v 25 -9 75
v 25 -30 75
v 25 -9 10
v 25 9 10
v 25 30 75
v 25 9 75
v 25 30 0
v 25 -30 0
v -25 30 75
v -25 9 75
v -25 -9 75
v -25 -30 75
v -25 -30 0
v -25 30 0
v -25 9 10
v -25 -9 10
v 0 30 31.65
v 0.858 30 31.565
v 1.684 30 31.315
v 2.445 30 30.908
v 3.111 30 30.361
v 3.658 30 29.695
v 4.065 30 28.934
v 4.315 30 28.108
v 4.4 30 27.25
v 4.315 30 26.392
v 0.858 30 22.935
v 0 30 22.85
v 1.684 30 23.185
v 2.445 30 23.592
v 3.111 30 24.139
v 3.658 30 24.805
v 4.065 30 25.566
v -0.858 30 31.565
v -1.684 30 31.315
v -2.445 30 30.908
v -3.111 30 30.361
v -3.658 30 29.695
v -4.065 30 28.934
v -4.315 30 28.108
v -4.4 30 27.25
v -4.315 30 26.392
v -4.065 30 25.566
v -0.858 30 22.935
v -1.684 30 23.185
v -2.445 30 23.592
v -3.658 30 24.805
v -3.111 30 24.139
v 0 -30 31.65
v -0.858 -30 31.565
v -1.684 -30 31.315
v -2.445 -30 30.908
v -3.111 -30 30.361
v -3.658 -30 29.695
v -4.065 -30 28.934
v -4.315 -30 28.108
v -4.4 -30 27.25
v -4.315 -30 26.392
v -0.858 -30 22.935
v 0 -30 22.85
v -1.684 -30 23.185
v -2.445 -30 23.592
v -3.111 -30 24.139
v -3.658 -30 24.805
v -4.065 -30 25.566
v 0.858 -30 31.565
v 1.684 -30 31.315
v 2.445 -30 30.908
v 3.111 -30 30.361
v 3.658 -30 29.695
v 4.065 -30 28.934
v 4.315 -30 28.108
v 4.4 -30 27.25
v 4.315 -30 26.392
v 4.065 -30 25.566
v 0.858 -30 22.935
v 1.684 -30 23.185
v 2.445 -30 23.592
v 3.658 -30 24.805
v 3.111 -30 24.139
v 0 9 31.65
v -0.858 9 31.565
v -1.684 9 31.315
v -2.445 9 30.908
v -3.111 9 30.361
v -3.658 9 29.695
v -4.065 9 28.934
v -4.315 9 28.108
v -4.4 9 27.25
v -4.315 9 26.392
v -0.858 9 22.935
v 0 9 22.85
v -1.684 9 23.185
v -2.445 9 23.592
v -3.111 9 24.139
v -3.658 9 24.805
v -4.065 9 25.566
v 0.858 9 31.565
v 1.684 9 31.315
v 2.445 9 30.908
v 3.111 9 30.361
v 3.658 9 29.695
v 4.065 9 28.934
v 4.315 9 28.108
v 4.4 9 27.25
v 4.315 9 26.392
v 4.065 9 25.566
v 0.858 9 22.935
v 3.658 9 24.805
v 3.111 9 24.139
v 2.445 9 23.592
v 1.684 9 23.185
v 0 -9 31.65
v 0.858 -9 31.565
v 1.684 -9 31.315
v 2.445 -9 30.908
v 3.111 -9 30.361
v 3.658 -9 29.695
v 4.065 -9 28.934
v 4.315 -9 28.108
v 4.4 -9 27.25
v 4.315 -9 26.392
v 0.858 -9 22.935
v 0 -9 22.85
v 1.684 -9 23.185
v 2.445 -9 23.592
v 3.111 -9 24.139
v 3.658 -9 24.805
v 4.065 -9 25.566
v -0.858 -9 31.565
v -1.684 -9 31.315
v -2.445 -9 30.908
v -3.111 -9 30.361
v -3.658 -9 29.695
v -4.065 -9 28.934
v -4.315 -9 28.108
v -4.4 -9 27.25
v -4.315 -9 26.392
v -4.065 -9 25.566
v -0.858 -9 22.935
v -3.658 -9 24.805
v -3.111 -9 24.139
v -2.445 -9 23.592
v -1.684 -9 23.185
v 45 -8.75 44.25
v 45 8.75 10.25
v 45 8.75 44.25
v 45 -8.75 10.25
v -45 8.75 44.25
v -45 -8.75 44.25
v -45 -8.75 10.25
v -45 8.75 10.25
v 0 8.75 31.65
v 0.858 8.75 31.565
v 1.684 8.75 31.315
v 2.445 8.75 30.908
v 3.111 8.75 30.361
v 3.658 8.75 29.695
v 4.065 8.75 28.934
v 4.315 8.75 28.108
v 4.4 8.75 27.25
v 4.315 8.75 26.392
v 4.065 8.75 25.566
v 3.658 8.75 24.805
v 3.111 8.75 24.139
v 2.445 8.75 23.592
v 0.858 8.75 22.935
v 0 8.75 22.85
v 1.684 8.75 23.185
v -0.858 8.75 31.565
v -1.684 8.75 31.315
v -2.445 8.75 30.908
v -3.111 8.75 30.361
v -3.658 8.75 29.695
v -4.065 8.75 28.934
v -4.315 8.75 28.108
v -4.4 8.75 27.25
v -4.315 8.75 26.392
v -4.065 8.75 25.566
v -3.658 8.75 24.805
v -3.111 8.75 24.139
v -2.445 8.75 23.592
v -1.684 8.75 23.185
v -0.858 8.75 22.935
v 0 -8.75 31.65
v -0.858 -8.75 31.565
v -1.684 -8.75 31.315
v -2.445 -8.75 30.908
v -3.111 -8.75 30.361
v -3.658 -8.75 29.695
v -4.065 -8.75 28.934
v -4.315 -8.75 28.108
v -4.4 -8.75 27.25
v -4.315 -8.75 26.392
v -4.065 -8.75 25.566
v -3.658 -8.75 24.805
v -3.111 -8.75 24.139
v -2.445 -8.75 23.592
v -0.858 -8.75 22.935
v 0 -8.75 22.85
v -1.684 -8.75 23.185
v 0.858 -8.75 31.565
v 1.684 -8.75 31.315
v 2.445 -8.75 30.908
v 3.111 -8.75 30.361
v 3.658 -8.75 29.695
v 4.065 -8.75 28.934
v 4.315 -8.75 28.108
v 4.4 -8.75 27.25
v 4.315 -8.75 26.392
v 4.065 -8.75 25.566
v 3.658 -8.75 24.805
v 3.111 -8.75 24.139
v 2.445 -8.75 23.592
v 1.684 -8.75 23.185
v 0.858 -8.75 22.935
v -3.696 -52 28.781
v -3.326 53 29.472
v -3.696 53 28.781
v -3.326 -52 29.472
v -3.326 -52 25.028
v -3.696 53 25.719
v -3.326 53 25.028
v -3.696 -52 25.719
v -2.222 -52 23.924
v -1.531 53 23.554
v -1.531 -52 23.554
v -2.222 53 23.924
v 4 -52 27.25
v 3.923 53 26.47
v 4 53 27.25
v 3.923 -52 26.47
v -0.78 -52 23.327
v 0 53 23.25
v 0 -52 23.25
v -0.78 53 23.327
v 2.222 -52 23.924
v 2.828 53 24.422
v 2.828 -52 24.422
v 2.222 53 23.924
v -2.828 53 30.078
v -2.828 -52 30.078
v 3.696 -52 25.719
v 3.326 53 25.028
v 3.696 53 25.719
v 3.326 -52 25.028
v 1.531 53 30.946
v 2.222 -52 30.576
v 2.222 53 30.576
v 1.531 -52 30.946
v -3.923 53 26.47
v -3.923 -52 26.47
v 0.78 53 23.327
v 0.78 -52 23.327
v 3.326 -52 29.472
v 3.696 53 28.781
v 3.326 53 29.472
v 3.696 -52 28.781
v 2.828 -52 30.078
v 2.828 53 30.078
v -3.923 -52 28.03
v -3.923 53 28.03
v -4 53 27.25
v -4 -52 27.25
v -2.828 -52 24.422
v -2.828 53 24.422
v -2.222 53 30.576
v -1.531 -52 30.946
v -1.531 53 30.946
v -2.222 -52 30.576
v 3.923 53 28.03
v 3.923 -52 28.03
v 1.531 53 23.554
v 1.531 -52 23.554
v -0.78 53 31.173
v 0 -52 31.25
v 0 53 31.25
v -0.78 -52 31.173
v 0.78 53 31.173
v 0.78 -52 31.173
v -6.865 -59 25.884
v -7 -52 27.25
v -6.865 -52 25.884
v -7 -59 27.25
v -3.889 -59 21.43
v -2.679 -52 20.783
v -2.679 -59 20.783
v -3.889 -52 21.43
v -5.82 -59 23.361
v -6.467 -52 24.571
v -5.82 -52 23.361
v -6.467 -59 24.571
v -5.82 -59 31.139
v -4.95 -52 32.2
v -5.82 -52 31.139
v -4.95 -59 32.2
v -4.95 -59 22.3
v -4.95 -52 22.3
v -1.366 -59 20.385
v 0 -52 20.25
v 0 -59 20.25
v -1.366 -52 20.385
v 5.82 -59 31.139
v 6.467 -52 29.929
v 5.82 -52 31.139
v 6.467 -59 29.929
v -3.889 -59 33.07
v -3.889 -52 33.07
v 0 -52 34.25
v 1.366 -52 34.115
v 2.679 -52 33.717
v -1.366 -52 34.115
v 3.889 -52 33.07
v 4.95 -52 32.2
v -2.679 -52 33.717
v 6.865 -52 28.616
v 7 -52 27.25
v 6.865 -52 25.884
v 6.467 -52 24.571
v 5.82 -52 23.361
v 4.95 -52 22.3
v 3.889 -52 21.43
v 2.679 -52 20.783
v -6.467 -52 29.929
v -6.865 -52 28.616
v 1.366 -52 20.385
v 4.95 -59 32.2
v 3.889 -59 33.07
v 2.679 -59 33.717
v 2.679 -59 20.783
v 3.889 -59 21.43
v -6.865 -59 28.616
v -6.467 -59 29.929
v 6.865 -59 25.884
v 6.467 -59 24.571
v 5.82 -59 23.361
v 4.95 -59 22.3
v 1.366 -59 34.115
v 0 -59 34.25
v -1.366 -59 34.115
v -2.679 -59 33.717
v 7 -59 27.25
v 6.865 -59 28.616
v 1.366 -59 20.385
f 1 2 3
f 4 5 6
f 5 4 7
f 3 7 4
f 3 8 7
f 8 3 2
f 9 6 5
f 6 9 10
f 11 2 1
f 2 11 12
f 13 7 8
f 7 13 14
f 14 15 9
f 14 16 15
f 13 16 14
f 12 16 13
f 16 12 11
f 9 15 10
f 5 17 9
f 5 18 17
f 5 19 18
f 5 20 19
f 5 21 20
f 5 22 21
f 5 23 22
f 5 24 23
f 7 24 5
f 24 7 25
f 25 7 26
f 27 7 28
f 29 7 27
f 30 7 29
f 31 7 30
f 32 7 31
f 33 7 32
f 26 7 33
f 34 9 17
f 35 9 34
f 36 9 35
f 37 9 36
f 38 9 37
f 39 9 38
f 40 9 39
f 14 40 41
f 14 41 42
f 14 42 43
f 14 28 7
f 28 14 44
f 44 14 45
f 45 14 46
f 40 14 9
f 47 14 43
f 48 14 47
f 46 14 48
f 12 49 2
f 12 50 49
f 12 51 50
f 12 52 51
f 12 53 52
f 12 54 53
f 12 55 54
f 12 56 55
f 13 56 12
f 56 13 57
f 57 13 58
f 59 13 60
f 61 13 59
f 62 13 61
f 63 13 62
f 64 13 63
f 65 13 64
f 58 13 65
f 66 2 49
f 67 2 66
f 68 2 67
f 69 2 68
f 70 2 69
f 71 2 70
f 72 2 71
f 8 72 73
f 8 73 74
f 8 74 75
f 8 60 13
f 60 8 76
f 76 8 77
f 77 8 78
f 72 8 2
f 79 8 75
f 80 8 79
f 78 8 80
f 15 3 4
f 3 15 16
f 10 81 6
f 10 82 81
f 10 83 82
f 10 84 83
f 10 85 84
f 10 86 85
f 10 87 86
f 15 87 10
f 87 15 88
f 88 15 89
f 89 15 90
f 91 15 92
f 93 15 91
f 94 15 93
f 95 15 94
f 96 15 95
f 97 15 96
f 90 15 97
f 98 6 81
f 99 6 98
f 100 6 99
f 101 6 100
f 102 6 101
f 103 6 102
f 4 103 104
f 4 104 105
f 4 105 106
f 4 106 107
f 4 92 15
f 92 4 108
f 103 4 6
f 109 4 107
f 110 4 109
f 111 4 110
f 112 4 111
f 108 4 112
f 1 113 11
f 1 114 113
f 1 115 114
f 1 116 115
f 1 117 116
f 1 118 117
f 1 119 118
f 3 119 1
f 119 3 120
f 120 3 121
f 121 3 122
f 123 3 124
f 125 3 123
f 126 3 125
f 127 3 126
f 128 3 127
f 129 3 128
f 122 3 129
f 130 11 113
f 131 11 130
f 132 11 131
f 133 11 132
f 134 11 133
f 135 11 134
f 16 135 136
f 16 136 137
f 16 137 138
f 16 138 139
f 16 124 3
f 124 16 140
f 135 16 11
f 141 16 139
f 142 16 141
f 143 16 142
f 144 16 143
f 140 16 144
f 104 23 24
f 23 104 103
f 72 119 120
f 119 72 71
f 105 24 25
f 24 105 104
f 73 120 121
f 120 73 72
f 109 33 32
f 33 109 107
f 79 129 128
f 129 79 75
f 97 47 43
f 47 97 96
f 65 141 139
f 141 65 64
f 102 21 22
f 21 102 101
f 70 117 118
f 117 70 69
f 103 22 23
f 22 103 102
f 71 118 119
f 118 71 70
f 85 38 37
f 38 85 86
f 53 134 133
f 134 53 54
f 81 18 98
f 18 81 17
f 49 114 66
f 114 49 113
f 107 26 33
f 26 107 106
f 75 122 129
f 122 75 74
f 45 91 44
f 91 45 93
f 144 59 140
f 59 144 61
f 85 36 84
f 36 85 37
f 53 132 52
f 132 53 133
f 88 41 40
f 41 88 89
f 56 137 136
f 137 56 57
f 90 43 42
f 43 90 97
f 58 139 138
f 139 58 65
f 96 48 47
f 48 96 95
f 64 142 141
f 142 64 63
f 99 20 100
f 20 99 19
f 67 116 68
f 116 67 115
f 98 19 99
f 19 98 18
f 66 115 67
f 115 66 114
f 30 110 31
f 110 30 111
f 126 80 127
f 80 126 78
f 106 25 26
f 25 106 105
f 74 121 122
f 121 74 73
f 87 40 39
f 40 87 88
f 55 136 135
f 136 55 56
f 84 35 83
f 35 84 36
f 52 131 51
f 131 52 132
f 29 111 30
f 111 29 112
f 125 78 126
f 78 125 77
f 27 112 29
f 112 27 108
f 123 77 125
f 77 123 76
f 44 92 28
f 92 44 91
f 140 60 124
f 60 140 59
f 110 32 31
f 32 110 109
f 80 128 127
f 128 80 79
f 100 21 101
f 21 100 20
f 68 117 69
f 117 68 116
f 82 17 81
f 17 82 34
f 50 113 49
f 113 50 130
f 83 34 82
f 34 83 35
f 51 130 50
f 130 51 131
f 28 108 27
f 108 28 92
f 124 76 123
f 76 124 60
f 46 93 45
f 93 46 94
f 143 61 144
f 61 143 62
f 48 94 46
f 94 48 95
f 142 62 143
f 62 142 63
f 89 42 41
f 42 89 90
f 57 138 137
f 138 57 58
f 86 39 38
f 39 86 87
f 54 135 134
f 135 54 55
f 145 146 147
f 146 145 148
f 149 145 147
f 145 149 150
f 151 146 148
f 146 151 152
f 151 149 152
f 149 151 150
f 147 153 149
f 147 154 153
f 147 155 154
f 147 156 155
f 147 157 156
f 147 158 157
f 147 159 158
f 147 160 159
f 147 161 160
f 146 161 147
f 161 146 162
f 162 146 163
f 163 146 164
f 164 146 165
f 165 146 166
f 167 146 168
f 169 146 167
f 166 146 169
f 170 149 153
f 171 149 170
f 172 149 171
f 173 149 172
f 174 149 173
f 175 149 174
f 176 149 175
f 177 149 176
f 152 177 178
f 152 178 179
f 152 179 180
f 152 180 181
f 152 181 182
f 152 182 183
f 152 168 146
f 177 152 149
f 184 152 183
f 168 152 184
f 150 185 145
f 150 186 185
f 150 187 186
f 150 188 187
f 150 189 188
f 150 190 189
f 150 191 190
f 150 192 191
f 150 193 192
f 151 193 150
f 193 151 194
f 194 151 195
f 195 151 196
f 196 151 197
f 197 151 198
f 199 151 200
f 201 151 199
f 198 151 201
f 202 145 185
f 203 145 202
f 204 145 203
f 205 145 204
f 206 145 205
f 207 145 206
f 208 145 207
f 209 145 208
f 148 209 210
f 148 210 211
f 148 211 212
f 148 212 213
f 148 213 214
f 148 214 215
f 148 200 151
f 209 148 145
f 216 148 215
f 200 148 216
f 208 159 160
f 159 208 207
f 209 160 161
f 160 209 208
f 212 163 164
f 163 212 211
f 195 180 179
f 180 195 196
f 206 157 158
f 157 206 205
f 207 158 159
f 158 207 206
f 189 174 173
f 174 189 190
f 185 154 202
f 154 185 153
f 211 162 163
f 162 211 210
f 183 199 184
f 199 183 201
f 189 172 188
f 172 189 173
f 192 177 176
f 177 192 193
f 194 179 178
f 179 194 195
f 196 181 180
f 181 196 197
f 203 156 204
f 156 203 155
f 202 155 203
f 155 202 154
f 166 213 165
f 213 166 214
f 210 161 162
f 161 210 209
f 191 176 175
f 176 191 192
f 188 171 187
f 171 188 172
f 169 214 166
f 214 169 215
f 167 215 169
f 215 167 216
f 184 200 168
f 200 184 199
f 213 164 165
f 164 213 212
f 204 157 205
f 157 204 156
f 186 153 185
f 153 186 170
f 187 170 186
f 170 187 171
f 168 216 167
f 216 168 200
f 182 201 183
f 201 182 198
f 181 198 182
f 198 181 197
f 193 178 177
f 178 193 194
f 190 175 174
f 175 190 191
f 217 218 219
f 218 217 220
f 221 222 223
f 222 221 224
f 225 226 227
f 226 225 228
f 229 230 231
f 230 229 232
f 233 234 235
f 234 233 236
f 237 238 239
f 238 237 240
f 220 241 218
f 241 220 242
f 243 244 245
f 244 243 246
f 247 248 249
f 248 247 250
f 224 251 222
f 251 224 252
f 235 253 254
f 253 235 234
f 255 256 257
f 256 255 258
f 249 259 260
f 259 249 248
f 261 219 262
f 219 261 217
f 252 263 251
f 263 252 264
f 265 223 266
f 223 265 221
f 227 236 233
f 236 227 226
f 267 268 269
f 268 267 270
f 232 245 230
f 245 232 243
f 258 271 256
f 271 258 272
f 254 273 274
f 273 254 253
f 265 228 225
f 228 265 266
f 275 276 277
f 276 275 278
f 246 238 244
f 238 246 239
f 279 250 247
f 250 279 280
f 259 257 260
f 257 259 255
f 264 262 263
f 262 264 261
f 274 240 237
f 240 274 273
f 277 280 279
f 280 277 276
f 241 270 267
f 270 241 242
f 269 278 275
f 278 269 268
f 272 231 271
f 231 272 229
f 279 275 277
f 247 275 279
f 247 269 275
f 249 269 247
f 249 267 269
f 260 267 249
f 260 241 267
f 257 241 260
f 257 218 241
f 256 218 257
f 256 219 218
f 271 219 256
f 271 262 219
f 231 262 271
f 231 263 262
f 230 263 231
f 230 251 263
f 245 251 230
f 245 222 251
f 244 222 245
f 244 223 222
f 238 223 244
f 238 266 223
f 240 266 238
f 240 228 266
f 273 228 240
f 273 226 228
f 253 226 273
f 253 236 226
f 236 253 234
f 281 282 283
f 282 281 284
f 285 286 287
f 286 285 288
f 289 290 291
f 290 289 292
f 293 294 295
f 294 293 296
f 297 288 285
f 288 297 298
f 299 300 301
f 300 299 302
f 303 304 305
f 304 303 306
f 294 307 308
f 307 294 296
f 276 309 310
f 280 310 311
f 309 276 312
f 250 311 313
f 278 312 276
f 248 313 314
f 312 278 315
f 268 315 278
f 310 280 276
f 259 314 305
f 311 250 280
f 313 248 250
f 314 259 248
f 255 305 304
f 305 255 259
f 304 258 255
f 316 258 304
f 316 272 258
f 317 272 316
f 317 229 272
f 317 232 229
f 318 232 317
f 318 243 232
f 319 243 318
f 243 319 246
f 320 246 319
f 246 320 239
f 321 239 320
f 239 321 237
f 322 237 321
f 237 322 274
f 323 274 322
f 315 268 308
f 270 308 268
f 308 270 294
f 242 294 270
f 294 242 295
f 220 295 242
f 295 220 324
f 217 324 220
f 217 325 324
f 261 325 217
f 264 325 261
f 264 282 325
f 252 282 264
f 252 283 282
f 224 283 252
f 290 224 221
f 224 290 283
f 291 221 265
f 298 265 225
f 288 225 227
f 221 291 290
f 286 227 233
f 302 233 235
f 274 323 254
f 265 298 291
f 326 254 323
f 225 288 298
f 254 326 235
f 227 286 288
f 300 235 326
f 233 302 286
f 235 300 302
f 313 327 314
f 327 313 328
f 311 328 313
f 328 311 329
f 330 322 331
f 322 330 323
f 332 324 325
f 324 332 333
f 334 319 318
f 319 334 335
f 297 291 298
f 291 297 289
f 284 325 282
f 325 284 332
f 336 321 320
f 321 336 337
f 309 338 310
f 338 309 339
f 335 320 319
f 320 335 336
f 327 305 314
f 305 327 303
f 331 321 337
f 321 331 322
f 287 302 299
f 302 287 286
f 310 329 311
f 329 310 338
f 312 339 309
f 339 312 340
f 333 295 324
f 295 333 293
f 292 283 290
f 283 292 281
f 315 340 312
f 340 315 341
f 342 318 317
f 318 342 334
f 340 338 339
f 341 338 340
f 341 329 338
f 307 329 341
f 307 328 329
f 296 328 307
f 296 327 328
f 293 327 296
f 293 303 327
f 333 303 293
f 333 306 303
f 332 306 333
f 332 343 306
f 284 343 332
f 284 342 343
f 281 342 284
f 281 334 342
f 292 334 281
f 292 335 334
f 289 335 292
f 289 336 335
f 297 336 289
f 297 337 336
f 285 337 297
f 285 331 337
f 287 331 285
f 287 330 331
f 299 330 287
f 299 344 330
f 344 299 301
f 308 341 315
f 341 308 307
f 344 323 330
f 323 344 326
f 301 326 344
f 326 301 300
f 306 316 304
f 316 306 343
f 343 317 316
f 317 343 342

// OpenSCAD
$fn = 32;

// ------------------------------------------------------------------------
// Clevis joint: 50 mm clevis, pin d8
// Every part is its own module, assembly() places them once.
// ------------------------------------------------------------------------

// --- part 1 ---
module clevis() {
  difference() {
    translate([-25, -30, 0]) cube([50, 60, 75]);
    translate([-26, -9, 10]) cube([52, 18, 66]);
    translate([0, 0, 27.25]) rotate([90, 0, 0]) cylinder(h = 62, d = 8.8, center = true);
  }
}

// --- part 2 ---
module eye() {
  difference() {
    translate([-45, -8.75, 0]) cube([90, 17.5, 34]);
    translate([0, 0, 17]) rotate([90, 0, 0]) cylinder(h = 19.5, d = 8.8, center = true);
  }
}

// --- part 3 ---
module pin() {
  rotate([0, 90, 0]) cylinder(h = 106, d = 8, center = true);
  translate([-59, 0, 0]) rotate([0, 90, 0]) cylinder(h = 7, d = 14);
}

// --- assembly ---
module assembly() {
  translate([0, 0, 0]) rotate([0, 0, 0]) clevis();
  translate([0, 0, 10.25]) rotate([0, 0, 0]) eye();
  translate([0, 0, 27.25]) rotate([0, 0, 90]) pin();
}

assembly();
